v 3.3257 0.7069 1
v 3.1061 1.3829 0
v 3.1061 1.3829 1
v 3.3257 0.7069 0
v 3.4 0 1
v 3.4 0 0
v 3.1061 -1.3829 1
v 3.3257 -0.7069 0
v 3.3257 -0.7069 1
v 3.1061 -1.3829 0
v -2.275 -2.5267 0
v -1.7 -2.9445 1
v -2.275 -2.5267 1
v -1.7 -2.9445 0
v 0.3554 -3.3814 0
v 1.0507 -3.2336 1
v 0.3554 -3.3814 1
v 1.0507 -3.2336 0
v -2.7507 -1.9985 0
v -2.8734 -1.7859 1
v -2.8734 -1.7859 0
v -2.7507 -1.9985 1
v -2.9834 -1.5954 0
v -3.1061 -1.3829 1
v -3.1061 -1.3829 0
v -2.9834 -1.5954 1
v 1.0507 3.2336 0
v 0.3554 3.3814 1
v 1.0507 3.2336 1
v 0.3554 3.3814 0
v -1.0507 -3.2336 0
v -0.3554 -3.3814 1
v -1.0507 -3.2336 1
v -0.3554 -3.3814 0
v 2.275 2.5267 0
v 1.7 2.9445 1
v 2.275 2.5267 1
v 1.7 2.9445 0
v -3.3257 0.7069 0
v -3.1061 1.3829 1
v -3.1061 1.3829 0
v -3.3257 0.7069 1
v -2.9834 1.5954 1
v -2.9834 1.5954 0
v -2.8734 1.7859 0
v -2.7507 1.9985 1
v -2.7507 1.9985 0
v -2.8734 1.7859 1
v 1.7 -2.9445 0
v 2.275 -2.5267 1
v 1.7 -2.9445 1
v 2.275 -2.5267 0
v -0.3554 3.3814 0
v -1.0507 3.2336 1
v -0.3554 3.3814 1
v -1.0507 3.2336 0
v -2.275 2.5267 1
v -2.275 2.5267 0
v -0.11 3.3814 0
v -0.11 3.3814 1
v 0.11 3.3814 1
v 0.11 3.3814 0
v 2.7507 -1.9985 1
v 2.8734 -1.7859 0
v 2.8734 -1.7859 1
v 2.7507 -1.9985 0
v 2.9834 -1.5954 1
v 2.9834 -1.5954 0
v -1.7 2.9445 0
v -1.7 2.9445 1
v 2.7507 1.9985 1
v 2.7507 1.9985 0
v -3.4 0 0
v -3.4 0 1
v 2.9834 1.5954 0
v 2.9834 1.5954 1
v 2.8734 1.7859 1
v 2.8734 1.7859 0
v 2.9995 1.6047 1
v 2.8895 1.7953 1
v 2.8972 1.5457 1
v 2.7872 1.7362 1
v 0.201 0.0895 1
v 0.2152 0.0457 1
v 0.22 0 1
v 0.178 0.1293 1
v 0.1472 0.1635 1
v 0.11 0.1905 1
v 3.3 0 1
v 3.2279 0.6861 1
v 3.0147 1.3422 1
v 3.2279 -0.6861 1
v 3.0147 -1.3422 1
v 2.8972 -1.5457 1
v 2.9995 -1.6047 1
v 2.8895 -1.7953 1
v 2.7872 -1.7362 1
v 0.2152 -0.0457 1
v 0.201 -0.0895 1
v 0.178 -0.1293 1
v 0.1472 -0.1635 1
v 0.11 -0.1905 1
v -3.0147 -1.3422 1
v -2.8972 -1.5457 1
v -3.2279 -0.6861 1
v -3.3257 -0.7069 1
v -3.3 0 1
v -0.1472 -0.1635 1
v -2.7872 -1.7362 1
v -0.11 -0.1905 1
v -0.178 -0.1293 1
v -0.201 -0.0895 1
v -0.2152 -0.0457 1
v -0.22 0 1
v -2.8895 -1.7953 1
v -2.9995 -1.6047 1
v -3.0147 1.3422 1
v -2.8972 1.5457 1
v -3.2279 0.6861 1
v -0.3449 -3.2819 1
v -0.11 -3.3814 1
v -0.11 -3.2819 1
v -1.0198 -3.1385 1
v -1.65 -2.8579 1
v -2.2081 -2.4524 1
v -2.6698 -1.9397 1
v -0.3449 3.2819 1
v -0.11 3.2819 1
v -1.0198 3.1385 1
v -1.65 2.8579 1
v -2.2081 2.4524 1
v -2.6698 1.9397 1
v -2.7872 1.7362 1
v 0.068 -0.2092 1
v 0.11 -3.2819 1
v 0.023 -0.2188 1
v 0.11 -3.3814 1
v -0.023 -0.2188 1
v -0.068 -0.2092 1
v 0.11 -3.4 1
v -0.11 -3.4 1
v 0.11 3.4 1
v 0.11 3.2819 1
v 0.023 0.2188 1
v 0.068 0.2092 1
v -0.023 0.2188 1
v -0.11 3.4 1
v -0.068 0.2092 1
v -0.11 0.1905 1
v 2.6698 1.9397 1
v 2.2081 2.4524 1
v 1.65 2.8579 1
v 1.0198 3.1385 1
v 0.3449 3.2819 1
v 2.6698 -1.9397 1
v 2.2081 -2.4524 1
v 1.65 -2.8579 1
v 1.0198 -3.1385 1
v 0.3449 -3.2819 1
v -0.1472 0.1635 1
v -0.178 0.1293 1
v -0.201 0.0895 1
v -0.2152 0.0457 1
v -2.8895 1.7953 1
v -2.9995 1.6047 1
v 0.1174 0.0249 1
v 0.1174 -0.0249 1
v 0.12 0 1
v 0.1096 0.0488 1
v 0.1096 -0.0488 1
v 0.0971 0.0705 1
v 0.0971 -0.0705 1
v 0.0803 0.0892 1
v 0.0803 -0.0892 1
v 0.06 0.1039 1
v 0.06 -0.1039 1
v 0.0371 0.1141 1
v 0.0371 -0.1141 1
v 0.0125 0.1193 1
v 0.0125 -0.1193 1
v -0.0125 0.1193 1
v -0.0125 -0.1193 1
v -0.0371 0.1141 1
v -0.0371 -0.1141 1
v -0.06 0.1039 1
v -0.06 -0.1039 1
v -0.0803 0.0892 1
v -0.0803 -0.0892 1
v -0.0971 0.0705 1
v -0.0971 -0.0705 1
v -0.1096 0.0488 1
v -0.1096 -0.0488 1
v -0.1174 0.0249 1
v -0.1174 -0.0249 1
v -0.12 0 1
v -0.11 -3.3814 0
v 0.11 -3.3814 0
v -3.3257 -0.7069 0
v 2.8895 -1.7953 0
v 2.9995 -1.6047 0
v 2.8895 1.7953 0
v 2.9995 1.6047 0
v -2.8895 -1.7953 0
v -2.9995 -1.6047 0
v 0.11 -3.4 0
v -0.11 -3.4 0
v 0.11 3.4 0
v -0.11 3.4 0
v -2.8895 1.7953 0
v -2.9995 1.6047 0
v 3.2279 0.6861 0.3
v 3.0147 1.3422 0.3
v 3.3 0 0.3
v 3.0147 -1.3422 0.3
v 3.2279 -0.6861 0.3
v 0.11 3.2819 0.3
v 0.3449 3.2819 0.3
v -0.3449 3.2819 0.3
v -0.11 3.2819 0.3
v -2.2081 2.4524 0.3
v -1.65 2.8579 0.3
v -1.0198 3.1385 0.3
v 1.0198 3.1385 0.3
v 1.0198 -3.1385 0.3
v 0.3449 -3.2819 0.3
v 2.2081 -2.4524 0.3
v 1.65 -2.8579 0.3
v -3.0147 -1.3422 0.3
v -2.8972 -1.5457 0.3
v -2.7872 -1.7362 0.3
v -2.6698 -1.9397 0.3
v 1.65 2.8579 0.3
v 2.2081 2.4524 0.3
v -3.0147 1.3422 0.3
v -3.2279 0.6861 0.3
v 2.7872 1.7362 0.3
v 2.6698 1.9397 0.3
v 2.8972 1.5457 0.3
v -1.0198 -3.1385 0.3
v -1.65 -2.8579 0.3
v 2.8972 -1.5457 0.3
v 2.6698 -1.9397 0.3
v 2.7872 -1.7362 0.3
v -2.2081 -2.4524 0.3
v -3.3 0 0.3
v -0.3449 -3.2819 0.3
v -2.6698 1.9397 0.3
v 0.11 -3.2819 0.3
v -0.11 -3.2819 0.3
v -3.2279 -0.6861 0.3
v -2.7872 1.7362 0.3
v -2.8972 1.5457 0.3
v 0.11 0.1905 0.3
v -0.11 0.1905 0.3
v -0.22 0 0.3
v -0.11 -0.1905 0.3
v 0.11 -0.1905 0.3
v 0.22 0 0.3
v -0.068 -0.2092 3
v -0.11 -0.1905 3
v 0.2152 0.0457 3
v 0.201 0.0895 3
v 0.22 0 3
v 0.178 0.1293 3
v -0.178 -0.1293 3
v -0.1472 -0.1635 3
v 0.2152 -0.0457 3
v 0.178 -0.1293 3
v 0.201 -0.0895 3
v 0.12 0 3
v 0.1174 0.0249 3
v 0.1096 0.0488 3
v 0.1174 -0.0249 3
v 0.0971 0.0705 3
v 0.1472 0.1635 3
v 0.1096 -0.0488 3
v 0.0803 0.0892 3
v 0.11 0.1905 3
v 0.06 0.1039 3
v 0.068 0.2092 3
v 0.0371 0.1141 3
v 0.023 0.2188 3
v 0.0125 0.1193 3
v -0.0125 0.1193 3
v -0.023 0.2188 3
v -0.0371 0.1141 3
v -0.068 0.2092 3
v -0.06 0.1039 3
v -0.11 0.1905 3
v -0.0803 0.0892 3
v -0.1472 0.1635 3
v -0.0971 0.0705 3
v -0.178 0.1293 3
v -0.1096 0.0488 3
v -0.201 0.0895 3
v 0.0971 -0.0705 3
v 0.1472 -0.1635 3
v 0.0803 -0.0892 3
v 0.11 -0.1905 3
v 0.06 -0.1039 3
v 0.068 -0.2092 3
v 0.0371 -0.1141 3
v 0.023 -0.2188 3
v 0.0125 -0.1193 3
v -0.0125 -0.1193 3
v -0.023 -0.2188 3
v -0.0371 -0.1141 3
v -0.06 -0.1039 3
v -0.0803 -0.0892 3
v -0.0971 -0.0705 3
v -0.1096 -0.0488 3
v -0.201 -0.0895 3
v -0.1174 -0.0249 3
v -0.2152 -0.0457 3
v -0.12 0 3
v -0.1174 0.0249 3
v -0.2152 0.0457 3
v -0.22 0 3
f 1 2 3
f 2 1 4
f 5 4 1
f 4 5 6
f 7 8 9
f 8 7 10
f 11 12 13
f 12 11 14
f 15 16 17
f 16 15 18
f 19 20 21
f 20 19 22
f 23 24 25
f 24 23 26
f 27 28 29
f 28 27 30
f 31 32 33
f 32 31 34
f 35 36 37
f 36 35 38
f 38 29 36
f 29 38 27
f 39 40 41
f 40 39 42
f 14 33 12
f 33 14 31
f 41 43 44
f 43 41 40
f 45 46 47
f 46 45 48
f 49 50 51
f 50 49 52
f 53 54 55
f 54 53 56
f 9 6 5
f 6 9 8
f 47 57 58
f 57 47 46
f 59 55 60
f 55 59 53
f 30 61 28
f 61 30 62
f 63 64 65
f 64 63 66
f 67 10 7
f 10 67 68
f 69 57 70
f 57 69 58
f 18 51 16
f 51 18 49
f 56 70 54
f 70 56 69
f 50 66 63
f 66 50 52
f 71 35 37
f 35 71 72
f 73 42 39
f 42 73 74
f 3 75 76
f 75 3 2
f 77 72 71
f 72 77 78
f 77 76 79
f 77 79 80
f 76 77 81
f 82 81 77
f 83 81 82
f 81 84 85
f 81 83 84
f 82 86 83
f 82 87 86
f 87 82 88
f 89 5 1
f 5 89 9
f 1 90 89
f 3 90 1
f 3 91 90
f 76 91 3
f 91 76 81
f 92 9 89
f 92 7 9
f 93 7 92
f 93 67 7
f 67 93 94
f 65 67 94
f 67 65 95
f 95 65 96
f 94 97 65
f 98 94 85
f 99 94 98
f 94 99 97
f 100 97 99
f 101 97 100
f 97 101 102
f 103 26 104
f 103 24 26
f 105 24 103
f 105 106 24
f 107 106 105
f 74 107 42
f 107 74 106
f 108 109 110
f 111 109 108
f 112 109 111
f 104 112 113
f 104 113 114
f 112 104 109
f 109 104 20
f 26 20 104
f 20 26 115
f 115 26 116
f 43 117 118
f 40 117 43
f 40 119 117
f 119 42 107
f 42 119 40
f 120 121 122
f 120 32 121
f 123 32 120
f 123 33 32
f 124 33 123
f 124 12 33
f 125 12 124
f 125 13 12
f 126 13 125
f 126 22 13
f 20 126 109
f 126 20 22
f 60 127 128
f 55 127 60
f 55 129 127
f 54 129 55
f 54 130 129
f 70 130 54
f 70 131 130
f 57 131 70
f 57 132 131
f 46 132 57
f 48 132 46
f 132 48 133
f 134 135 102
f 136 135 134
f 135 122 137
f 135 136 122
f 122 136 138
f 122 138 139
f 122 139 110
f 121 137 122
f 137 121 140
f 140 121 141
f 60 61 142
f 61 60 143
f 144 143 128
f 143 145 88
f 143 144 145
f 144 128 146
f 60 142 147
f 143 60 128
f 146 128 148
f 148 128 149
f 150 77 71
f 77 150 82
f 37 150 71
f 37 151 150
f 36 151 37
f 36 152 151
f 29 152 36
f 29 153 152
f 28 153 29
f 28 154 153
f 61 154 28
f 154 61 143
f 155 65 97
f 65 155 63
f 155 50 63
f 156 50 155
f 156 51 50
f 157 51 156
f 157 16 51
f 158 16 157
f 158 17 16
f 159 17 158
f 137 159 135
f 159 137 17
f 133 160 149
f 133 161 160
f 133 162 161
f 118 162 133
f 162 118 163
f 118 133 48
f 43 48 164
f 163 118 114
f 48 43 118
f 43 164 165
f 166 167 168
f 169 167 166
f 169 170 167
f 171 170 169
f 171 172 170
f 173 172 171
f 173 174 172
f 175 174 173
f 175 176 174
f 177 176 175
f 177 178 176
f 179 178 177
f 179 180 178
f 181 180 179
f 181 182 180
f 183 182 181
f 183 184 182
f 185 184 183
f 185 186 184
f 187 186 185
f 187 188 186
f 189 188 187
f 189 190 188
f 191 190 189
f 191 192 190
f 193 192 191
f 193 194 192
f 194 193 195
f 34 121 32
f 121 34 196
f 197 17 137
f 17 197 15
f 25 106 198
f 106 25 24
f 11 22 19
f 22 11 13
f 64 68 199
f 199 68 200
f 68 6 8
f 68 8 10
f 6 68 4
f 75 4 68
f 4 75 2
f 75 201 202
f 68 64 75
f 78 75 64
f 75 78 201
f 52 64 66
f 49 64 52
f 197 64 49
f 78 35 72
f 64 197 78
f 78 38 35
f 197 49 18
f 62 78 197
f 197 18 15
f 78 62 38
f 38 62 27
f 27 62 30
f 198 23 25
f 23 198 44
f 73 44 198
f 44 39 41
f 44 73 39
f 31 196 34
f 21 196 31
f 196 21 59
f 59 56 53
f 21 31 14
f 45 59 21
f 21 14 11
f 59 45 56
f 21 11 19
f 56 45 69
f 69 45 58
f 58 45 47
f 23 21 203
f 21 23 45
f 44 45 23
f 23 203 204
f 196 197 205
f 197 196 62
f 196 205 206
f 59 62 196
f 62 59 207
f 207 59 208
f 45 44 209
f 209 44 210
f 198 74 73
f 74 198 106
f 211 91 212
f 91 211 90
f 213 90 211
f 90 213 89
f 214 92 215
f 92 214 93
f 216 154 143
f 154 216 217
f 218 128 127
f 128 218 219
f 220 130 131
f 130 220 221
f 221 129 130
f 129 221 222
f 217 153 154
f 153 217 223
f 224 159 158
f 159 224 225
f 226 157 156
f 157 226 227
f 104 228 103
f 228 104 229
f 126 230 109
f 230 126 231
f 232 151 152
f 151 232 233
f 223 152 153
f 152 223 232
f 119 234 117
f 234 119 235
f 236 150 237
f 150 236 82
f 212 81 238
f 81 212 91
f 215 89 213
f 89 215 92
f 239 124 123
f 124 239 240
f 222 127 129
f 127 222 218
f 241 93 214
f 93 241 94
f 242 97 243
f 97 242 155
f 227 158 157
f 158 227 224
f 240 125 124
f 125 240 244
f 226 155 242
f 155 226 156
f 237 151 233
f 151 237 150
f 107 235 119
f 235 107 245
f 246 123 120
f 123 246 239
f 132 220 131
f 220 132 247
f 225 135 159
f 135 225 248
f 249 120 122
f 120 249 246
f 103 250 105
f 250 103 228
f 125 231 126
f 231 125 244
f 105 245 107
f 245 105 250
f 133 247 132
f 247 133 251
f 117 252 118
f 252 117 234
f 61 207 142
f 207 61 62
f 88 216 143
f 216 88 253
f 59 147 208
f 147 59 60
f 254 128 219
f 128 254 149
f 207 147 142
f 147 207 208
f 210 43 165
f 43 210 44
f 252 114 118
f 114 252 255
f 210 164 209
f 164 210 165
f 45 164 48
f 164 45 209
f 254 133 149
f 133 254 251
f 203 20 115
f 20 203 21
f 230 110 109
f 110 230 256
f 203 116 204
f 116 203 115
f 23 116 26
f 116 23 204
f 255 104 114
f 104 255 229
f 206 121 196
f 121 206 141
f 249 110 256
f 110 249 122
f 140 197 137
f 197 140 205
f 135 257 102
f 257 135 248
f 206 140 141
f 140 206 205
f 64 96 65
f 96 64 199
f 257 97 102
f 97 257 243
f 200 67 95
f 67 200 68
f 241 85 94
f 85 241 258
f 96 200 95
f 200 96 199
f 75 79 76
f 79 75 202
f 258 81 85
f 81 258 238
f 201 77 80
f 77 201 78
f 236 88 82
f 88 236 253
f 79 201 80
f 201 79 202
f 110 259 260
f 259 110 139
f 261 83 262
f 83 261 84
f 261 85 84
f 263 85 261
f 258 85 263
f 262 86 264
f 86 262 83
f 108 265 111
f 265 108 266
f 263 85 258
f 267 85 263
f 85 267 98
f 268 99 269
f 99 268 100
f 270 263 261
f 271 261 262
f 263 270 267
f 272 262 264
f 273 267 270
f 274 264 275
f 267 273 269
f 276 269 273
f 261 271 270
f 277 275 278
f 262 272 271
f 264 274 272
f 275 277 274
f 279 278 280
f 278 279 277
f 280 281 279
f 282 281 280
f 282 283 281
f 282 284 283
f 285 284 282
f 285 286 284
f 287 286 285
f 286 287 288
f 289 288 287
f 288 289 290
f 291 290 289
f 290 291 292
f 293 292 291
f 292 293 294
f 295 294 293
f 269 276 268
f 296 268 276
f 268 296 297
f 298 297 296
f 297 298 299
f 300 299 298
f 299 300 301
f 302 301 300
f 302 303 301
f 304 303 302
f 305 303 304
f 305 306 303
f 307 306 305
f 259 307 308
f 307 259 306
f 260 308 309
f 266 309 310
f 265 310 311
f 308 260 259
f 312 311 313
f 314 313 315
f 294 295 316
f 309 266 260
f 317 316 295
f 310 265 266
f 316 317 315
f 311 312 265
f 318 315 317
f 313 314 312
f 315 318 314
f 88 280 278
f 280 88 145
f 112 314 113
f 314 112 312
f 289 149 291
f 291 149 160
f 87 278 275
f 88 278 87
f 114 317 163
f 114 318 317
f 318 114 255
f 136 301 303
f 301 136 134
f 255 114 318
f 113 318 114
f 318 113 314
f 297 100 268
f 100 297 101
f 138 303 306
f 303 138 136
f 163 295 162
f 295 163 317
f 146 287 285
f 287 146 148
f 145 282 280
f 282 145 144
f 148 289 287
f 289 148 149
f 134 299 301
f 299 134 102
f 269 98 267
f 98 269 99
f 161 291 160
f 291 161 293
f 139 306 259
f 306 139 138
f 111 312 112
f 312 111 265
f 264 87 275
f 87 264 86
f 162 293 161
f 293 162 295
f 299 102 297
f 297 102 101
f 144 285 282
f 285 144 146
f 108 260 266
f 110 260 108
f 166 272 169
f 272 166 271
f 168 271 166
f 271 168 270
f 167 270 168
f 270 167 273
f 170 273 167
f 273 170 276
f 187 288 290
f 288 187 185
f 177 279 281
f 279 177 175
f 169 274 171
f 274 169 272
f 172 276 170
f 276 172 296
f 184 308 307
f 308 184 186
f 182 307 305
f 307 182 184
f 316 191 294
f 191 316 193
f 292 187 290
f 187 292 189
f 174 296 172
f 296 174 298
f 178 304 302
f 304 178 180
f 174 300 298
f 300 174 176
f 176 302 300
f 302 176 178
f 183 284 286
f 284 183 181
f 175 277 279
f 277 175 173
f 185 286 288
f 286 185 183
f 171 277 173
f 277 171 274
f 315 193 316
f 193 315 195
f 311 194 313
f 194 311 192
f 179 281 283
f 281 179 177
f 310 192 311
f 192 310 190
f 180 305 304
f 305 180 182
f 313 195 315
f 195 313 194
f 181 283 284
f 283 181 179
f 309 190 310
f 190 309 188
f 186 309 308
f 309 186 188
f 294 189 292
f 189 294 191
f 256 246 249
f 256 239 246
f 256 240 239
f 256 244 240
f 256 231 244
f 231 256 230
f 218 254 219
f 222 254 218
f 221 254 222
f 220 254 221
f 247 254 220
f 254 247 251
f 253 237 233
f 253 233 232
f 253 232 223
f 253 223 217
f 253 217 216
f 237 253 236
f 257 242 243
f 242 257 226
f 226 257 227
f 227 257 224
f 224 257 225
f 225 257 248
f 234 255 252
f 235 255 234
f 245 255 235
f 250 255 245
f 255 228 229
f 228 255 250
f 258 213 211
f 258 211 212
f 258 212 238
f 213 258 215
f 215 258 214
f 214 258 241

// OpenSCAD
$fs = 0.01;

total_height = 1;
base_height = 0.3;
radius = 3.4;
shell_thickness = 0.1;

beam_width = 0.22;
beams = 6;

central_beam_extra_height = 2;
central_beam_radius=0.22;
central_beam_thickness=0.1;

module shell(height,radius, thickness){
    difference(){
        cylinder(h=total_height,r=radius);
        cylinder(h=total_height,r=radius-thickness);
    }
}

module base(height, radius){
    cylinder(h=height,r=radius);
}


module beams(n=4, width, height, radius) {
    angle = 360 / n;
    for(i=[0:n]){
      rotate(i*angle){
        translate([-beam_width/2,0,0]){
                cube([beam_width,radius,height]);
            }
        }    
    }
}

module central_beam(height,radius, thickness){   
    difference(){
        cylinder(
            h=height,
            r=radius
        );
        cylinder(
            h=height,
            r=radius-thickness
        );
    }
}


shell(
    height=total_height,
    radius=radius,
    thickness=shell_thickness
);
base(
    height=base_height, 
    radius=radius
);
beams(
    n=beams,
    width=beam_width, 
    height=total_height,
    radius=radius
);
central_beam(
    height=central_beam_extra_height+total_height,
    radius=central_beam_radius,
    thickness=central_beam_thickness
);
